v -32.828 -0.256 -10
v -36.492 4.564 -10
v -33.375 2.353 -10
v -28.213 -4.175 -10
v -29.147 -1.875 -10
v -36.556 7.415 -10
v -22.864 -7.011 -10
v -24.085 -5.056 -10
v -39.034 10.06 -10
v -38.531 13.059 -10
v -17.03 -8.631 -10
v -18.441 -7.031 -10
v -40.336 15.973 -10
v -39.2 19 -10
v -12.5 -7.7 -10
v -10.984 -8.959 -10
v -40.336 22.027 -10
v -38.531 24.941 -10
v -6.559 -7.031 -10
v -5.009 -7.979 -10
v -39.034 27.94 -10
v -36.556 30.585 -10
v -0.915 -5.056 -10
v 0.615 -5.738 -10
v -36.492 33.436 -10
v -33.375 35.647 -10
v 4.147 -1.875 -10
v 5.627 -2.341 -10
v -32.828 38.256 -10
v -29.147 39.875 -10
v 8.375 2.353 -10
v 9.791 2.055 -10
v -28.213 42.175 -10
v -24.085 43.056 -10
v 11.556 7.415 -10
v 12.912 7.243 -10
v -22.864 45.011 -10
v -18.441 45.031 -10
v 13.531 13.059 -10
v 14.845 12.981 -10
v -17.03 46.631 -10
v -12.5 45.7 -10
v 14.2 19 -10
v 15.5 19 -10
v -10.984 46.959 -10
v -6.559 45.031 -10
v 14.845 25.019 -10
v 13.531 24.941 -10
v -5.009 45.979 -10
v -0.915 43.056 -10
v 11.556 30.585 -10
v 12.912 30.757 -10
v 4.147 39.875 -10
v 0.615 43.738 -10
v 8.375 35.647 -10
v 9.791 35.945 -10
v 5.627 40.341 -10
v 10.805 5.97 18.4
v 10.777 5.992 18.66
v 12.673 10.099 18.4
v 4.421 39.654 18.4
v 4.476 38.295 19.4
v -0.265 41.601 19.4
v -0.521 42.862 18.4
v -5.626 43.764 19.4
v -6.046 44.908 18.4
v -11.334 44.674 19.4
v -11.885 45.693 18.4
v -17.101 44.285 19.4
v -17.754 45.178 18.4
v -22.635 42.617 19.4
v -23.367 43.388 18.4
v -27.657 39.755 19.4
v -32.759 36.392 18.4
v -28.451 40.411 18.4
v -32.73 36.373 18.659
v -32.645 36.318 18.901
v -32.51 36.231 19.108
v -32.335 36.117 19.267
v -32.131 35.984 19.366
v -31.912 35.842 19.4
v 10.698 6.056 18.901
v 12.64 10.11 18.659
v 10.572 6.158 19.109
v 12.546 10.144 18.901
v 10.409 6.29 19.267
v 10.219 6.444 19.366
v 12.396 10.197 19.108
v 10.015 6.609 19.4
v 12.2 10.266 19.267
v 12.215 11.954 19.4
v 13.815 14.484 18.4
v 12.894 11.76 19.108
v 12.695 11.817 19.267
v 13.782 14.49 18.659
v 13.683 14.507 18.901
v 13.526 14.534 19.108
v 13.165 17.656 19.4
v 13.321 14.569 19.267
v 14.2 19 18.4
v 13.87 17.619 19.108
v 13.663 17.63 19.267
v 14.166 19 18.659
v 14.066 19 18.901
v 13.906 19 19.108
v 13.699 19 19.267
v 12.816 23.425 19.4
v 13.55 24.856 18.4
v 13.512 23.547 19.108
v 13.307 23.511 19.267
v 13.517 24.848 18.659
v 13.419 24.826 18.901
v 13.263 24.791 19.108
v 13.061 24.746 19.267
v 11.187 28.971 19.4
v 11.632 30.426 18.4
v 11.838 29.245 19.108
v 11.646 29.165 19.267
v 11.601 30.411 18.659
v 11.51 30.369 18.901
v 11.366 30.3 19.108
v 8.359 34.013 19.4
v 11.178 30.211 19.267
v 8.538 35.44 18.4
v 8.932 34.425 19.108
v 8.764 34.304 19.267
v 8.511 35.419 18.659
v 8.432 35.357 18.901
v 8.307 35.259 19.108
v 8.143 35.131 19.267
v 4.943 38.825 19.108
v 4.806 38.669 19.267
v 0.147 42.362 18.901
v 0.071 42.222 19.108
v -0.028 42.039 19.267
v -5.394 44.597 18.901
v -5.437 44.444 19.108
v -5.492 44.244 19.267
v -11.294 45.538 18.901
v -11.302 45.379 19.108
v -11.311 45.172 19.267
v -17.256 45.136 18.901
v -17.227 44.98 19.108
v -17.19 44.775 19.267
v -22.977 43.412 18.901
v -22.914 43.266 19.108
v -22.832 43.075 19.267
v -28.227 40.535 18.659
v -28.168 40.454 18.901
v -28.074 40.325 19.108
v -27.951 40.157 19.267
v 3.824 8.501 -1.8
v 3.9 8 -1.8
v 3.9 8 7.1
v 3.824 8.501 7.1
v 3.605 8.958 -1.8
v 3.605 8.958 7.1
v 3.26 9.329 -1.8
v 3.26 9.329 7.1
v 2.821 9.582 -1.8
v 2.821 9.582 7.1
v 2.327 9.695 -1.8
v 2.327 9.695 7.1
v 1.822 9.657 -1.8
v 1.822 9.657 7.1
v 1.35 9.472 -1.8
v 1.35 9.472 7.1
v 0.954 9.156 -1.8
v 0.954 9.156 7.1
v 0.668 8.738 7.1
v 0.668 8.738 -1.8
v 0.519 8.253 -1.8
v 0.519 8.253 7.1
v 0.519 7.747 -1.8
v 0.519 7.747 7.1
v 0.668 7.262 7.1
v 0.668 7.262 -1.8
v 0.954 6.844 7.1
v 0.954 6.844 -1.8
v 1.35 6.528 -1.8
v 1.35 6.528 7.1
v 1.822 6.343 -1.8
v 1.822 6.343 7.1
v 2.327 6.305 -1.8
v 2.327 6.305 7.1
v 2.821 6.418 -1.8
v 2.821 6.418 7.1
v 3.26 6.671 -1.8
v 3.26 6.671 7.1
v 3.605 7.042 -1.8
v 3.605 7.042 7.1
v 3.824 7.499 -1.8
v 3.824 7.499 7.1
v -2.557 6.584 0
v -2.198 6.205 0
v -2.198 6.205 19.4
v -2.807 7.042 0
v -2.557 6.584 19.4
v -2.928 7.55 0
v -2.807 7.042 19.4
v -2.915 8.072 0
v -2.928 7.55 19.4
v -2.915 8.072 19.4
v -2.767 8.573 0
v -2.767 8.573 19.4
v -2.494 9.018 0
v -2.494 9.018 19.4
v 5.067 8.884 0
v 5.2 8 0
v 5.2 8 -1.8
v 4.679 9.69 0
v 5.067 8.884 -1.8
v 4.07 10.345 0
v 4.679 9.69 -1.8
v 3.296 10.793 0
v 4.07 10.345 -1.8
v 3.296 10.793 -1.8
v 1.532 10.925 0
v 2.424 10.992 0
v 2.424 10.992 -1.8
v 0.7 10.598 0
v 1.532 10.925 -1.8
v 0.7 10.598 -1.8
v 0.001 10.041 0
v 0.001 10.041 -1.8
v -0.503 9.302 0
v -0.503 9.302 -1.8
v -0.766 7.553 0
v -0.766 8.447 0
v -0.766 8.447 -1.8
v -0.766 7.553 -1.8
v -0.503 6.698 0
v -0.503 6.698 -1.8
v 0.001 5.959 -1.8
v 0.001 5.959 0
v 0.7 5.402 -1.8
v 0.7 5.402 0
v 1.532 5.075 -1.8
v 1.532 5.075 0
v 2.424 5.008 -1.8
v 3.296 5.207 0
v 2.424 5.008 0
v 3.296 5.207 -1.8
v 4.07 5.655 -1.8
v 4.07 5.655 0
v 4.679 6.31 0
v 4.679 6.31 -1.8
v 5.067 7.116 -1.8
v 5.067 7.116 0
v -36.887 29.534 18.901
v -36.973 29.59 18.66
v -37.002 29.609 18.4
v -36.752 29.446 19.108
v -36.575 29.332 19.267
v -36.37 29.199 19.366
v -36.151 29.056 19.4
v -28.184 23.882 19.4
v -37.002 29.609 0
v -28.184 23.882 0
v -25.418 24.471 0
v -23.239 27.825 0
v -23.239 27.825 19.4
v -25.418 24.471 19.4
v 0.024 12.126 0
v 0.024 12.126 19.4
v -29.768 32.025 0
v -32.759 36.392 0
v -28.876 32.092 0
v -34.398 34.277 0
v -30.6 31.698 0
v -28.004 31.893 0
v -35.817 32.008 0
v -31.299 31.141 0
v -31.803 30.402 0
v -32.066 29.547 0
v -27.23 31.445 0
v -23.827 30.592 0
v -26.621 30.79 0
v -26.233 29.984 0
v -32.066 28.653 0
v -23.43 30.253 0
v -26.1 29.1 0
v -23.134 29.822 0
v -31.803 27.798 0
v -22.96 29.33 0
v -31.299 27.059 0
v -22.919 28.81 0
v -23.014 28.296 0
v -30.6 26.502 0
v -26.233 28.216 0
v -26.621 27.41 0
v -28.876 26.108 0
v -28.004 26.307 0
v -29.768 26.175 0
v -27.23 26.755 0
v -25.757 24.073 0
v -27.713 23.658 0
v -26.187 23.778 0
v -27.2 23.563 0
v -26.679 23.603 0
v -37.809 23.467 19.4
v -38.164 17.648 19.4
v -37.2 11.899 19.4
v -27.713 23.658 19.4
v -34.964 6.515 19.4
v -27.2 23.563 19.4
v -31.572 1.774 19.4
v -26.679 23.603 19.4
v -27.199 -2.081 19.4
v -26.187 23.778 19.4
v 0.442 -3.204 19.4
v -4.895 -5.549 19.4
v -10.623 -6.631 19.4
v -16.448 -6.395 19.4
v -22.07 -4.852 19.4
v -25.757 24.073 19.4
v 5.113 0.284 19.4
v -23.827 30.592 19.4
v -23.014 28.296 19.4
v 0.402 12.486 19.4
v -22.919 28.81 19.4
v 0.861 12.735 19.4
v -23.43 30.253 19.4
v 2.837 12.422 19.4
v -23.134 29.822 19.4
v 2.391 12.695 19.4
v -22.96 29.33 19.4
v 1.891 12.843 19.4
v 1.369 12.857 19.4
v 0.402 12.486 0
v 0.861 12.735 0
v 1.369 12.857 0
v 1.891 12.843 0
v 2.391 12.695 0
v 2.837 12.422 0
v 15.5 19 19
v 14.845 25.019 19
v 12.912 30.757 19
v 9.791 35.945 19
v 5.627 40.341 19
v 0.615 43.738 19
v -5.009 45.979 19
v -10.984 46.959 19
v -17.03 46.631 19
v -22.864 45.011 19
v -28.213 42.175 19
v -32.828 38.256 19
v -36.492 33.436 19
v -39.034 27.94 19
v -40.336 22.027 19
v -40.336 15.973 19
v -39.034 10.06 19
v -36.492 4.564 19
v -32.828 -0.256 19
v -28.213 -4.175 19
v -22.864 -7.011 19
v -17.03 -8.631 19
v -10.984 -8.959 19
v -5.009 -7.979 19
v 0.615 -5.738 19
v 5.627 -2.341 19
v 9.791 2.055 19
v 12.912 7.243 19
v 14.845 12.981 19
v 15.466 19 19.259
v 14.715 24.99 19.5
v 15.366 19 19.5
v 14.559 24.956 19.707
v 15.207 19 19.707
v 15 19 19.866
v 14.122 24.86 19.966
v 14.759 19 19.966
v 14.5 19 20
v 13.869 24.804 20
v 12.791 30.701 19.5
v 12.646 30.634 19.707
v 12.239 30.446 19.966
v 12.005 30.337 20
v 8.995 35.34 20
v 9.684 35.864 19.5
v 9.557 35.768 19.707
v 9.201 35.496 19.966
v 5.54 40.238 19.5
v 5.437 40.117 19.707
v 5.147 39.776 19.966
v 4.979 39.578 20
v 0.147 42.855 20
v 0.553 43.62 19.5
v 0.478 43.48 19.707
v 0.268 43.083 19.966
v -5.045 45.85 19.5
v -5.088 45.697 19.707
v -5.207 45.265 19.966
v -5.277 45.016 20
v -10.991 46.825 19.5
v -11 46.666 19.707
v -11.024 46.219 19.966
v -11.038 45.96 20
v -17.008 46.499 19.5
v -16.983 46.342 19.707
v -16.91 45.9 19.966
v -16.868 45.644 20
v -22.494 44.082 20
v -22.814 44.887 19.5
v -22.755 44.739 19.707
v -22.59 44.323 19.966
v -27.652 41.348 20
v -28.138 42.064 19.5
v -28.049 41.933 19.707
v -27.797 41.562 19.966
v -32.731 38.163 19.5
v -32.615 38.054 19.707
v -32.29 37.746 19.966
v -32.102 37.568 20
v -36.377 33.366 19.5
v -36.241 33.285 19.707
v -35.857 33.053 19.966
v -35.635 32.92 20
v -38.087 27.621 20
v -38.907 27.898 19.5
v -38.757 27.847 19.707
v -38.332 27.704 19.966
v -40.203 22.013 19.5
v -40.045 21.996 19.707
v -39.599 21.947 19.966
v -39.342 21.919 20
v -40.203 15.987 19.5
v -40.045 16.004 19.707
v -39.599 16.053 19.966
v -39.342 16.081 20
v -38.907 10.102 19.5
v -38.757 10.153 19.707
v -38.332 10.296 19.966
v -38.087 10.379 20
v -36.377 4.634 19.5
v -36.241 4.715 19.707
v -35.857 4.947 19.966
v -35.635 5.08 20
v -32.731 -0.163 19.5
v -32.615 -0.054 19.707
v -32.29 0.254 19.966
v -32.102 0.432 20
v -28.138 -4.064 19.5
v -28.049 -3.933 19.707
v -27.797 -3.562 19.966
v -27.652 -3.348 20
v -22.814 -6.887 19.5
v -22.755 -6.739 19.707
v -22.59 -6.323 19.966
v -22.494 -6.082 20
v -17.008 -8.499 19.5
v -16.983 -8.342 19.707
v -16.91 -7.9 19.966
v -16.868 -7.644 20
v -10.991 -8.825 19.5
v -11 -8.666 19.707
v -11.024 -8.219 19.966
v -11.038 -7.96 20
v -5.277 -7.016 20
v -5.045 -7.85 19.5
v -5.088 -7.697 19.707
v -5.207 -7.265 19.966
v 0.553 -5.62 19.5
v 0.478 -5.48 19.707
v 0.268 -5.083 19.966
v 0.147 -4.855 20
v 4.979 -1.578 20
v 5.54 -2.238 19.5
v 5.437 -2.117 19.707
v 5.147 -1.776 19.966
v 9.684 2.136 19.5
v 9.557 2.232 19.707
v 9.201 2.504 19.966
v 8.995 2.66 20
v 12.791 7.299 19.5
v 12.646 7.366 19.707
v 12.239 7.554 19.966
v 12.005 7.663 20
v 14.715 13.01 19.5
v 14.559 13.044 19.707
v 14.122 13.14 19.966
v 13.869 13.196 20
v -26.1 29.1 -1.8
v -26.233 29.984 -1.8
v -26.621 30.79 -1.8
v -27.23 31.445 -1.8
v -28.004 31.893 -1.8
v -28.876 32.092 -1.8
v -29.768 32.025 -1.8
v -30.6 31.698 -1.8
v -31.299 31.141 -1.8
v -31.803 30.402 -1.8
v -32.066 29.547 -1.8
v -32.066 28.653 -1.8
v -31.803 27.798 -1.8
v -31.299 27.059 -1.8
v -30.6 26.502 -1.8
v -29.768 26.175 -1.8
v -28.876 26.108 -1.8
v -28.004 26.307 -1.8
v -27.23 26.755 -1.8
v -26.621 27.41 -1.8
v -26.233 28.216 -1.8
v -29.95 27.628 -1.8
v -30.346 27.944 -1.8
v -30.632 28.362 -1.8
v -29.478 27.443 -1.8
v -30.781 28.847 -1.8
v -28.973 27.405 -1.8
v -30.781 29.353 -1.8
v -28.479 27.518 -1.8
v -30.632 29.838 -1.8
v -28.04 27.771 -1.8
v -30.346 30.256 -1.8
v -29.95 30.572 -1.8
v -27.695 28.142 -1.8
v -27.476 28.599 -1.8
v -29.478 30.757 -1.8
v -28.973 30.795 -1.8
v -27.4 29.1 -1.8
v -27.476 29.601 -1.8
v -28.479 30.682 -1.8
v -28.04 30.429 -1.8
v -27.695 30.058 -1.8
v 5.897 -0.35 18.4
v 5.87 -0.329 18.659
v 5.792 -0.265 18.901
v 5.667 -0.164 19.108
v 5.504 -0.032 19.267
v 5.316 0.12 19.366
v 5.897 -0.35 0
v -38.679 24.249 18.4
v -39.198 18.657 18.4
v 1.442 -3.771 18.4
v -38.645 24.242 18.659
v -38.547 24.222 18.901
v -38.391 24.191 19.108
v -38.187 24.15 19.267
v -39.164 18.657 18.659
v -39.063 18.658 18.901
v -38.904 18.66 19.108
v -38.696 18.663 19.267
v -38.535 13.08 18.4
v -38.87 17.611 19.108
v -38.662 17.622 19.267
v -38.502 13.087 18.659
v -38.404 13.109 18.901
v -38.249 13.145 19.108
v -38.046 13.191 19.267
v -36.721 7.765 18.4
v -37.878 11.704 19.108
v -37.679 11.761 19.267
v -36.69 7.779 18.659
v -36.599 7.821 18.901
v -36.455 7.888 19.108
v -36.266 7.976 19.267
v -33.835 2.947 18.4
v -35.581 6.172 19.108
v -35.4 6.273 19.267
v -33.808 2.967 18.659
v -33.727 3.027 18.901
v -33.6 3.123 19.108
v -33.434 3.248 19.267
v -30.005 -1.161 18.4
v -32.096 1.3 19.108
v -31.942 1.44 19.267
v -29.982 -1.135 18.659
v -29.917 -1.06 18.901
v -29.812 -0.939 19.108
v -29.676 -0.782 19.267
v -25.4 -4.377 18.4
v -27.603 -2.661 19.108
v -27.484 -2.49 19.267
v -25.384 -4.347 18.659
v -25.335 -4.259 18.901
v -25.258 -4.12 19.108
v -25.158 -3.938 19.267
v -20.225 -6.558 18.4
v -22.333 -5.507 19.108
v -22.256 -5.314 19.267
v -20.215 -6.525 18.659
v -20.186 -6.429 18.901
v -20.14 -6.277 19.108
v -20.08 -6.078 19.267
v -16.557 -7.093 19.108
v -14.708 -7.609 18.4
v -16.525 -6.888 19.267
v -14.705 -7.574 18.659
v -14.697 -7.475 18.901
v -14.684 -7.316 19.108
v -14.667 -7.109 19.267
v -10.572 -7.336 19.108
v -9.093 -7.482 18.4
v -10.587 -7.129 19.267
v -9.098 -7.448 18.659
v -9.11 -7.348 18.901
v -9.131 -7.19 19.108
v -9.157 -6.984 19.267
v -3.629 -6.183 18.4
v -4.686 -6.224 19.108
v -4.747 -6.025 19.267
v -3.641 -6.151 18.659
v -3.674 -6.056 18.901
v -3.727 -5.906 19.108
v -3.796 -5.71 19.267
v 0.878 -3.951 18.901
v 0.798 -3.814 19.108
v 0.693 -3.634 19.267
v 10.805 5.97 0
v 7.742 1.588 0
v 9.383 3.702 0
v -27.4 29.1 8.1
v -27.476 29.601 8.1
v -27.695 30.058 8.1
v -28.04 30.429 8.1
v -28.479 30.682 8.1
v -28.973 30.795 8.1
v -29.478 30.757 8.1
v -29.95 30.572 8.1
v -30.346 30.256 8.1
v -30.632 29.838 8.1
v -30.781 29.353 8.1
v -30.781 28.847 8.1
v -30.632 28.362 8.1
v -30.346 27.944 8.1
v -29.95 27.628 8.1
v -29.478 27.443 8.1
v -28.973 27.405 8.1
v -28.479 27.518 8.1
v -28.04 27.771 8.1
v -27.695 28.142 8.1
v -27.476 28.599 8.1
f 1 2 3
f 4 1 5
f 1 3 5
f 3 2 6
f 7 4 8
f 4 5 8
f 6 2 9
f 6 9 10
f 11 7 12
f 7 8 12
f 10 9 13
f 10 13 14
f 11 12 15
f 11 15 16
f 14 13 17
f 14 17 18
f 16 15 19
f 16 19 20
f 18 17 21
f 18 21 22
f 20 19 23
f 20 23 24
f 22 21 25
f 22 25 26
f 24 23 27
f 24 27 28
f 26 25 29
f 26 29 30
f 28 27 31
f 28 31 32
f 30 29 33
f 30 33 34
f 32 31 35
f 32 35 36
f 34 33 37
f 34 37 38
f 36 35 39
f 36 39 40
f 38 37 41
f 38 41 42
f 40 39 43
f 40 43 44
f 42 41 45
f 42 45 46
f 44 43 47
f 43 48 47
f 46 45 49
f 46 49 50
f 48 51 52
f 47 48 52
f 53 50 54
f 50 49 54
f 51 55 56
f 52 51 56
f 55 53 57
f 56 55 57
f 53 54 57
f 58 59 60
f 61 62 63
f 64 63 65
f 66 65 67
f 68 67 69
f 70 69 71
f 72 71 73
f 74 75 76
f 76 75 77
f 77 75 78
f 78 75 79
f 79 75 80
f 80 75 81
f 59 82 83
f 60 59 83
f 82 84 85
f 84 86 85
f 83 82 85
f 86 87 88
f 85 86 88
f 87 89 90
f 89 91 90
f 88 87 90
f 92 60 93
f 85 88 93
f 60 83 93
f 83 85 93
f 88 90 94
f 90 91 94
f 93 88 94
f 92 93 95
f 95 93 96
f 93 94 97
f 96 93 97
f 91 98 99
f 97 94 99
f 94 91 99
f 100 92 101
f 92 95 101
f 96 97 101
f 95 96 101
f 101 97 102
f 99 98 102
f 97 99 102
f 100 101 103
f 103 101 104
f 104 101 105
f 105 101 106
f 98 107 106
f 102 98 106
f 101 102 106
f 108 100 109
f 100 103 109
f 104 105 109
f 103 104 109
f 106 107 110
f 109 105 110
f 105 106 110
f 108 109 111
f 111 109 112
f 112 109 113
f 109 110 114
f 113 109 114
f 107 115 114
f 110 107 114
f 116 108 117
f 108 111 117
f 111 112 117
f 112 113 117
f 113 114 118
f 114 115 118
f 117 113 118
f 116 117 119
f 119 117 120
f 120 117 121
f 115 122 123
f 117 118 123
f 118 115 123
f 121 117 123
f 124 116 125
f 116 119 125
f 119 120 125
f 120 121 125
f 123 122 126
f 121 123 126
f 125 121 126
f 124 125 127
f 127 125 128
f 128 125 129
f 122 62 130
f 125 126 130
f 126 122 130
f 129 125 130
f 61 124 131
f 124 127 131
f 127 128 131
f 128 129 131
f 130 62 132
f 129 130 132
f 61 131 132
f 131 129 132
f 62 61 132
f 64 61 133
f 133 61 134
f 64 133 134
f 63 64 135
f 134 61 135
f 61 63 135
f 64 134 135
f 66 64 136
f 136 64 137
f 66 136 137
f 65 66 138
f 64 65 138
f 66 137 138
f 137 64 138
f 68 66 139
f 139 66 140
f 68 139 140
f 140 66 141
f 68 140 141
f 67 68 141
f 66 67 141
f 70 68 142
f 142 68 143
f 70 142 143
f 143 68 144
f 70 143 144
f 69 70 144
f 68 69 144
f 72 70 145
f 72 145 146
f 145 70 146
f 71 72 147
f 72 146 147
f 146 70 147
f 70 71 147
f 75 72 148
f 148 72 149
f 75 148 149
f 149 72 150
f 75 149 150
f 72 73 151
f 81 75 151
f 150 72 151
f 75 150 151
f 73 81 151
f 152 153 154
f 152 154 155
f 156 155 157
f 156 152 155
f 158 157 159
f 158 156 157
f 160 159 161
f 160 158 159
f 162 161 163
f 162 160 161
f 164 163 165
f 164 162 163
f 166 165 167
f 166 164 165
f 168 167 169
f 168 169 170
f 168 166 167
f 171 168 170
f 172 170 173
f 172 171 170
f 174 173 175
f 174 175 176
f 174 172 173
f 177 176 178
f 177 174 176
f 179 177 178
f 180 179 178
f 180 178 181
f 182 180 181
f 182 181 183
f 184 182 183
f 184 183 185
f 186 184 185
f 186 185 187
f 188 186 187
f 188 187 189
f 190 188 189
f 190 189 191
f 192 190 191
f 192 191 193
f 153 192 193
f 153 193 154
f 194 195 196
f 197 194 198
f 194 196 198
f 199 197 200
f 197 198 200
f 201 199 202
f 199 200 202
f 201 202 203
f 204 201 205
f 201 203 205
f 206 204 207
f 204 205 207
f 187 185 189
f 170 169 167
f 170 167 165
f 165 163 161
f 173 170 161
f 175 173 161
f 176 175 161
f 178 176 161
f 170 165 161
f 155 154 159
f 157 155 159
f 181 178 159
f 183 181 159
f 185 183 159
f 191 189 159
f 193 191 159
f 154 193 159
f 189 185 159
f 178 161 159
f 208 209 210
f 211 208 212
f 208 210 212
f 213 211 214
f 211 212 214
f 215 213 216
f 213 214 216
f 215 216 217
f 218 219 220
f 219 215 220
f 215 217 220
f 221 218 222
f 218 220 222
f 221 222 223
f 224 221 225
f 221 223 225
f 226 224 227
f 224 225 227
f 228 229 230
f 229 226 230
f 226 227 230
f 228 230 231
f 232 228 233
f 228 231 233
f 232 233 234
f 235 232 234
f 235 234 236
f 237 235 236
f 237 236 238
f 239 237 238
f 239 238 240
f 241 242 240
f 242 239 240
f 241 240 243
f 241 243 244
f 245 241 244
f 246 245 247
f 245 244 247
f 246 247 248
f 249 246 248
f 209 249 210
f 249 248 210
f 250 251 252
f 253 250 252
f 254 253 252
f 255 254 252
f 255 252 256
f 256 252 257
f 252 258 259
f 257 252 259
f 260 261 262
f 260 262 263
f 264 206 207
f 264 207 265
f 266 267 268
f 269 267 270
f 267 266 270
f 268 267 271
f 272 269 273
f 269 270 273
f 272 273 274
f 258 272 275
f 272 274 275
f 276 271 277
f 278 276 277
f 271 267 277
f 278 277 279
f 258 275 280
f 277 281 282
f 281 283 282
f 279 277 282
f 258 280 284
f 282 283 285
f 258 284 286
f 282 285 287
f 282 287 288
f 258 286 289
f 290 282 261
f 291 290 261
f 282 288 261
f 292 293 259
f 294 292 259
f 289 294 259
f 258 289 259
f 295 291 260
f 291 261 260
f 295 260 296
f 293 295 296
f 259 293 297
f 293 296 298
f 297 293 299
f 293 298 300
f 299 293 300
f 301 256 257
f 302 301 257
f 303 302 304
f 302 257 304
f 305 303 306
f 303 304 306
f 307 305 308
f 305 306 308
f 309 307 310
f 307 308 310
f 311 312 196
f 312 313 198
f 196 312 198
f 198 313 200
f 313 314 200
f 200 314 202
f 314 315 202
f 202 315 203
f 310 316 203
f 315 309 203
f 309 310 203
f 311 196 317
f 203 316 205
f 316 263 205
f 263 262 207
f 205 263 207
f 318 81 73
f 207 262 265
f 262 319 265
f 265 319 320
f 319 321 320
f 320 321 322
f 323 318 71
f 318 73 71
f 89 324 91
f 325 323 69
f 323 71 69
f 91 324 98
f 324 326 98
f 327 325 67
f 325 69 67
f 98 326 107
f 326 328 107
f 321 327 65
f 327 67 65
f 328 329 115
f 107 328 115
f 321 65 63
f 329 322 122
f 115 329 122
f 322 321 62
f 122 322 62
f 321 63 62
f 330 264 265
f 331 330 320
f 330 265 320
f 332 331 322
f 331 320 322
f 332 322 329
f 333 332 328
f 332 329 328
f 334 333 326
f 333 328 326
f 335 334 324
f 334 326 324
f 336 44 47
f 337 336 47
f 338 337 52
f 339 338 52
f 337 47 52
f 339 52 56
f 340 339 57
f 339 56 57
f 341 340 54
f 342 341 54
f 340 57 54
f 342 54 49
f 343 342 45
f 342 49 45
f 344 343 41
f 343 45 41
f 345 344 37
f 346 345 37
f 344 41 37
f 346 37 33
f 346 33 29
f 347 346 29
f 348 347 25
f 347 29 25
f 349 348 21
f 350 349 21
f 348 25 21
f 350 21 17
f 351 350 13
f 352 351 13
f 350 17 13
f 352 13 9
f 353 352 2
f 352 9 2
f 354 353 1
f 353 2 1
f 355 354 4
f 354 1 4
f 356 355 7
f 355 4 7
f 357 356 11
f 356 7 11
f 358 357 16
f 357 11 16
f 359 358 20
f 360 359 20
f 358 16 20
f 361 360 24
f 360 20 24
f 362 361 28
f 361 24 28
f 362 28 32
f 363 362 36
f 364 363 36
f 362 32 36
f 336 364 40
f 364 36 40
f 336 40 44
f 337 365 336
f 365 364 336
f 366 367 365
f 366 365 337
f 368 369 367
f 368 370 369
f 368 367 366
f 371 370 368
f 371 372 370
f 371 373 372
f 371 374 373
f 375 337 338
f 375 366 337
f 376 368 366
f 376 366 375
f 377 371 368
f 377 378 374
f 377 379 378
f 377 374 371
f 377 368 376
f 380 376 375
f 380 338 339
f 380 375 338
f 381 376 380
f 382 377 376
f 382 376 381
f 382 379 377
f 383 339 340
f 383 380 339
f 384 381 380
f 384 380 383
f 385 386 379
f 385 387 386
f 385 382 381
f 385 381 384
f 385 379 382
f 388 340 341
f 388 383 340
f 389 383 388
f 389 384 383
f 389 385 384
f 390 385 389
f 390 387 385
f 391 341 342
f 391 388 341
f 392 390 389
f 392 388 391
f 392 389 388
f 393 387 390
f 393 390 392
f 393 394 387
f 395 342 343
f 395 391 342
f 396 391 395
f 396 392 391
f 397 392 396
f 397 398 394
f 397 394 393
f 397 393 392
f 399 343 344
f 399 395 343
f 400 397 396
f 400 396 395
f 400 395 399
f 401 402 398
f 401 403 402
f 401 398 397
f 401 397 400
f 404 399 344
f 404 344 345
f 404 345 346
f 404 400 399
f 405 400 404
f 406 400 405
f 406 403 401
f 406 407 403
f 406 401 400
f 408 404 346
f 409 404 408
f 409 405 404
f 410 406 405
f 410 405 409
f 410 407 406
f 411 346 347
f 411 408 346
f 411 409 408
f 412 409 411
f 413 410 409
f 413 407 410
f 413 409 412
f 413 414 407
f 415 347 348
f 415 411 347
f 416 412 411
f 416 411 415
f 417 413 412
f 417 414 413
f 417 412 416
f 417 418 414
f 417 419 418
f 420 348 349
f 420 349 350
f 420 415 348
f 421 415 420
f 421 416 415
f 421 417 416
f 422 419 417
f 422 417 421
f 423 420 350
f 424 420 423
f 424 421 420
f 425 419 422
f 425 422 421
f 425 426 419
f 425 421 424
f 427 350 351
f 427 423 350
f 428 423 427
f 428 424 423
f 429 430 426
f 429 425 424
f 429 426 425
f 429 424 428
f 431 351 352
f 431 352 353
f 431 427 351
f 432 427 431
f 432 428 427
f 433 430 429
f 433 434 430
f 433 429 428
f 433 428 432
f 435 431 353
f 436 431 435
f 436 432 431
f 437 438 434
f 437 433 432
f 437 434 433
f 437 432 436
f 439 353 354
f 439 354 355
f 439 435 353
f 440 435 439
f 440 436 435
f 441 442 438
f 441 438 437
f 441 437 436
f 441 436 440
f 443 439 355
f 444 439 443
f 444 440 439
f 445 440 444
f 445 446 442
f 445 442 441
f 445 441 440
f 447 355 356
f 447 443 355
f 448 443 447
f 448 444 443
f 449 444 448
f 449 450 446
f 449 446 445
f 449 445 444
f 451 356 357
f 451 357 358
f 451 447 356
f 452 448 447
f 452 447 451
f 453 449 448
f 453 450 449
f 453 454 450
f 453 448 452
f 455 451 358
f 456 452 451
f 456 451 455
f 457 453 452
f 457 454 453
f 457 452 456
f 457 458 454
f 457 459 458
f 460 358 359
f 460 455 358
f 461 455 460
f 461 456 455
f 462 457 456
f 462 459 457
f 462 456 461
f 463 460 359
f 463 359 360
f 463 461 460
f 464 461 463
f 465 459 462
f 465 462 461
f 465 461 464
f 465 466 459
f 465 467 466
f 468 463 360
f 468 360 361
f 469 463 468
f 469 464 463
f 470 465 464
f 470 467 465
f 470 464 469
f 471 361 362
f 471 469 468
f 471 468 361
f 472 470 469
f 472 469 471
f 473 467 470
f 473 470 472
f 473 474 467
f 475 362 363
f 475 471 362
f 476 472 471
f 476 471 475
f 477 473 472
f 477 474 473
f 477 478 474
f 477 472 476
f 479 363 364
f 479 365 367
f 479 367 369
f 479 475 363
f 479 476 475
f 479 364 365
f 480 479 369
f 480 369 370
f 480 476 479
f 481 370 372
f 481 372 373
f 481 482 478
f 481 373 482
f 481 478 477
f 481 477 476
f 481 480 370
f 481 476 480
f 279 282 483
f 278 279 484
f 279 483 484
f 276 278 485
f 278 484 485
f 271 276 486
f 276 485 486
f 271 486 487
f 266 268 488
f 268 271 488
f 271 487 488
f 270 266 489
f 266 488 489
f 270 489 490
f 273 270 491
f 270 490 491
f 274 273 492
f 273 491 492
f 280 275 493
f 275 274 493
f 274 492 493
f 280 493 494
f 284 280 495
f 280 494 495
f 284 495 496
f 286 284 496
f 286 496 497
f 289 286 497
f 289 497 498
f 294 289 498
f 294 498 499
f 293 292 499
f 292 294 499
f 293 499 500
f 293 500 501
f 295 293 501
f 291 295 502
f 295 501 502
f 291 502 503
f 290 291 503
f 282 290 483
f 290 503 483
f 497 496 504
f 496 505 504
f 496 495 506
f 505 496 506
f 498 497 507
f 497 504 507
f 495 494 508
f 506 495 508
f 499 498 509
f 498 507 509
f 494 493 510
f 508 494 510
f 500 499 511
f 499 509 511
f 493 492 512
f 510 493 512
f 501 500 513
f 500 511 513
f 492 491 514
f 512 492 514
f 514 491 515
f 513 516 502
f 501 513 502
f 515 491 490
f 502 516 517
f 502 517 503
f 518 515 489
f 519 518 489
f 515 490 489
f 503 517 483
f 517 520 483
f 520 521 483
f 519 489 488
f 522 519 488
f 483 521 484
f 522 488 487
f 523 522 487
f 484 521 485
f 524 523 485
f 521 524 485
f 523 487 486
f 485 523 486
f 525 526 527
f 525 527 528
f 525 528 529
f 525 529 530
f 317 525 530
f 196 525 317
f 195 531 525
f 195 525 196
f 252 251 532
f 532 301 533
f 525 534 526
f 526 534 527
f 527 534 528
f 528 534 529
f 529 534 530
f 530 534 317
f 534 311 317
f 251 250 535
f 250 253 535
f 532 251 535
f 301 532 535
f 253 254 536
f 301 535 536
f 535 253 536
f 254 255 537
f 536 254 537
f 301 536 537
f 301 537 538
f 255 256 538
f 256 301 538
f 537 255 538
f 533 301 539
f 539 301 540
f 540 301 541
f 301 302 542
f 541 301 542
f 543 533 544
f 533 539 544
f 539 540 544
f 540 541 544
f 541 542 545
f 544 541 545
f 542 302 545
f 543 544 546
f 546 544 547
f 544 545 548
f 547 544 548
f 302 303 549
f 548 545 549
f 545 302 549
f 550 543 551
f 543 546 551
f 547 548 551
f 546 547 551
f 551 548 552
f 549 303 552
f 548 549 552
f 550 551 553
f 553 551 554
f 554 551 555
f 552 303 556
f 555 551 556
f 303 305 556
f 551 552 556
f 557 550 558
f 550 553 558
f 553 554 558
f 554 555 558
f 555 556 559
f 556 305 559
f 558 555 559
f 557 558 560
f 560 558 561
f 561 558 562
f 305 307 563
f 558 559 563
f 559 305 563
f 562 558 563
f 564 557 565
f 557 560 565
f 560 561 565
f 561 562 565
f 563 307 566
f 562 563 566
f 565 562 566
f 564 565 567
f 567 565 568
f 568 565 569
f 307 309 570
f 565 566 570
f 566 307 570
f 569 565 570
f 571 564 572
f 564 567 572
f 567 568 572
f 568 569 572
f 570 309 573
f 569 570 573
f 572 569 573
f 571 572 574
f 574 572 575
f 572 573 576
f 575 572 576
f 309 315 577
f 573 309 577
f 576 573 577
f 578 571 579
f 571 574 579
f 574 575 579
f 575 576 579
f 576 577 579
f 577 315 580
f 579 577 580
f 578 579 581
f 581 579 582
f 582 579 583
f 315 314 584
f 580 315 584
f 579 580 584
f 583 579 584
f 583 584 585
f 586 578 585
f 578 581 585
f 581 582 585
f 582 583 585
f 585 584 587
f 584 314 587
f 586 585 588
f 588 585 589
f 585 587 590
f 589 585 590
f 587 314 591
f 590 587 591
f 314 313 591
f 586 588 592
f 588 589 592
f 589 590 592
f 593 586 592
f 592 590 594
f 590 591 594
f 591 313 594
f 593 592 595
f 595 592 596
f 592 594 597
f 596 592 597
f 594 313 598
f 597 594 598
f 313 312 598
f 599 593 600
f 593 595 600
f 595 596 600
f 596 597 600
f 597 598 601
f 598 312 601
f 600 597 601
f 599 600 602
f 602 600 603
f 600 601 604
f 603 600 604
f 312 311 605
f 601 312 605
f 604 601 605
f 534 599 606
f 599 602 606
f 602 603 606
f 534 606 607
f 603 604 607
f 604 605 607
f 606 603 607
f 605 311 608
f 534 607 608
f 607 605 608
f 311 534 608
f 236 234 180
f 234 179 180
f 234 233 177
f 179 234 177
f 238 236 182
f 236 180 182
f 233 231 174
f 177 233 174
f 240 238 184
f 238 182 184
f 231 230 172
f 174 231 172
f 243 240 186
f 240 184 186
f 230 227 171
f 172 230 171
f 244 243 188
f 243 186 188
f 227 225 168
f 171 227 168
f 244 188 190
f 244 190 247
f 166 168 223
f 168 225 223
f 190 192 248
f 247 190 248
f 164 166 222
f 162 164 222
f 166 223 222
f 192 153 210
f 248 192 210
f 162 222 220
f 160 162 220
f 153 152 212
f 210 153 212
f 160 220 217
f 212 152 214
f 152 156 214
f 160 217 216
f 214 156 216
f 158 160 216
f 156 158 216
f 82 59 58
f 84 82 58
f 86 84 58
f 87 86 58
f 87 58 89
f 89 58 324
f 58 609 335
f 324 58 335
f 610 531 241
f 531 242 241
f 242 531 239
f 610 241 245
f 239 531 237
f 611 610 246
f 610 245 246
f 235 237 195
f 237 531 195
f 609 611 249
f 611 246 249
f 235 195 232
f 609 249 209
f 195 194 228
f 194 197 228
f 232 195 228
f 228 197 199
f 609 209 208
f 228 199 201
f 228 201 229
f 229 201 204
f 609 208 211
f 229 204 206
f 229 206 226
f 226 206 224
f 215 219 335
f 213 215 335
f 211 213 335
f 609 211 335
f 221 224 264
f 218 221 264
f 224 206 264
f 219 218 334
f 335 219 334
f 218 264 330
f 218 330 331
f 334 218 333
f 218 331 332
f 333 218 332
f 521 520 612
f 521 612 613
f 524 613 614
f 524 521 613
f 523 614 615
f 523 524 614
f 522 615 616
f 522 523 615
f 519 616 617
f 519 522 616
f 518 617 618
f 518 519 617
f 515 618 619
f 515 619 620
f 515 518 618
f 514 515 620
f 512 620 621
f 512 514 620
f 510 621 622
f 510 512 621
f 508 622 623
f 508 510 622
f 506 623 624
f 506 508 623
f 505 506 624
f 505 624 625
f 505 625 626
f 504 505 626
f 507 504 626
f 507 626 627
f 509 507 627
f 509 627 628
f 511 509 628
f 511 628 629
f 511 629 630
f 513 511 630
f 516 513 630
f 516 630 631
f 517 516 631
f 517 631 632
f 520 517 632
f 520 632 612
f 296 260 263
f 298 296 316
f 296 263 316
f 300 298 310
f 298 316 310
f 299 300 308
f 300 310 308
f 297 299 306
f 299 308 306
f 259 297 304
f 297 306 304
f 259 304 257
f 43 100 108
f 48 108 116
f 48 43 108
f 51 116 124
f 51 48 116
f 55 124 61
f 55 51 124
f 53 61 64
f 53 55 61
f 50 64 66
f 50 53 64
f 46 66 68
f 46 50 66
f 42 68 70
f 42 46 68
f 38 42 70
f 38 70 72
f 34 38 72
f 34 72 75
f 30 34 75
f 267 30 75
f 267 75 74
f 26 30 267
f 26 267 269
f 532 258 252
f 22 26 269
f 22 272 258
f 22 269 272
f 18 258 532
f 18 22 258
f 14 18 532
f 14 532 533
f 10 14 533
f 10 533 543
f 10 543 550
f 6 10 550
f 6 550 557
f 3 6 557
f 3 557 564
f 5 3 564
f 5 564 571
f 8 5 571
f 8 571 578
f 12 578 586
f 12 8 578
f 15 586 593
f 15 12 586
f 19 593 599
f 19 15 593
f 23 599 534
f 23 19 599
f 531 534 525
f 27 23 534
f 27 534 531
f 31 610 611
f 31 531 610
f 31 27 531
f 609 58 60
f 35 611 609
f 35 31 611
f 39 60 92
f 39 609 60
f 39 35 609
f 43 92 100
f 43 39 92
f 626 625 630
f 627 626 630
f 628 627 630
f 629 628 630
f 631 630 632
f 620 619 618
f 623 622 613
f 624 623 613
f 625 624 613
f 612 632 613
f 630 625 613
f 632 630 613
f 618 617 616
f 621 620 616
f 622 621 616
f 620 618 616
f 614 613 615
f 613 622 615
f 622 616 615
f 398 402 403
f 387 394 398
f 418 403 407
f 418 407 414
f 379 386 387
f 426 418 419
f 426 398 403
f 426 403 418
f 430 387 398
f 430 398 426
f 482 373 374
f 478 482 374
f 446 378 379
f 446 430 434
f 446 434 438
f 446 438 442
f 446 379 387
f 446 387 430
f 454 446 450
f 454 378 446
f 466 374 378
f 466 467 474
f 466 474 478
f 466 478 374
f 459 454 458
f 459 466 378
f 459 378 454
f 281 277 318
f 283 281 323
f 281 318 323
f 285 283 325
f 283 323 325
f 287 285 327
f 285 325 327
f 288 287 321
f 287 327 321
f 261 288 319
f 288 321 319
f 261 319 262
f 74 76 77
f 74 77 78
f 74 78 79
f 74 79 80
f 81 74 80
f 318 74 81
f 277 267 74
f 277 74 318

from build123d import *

# Parameters (mm, degrees)
CYLINDER027_R          = 1.7
CYLINDER027_DEPTH      = 10.5
CYLINDER026_R          = 1.7
CYLINDER026_DEPTH      = 11.5
CYLINDER018_R          = 26.7
CYLINDER018_DEPTH      = 30
CYLINDER019_R          = 28
CYLINDER019_DEPTH      = 30
FILLET001_R            = 1
BOX001_W               = 8
BOX001_H               = 13.5
BOX001_DEPTH           = 20
BOX001_PLACEMENT_ANGLE = 237
FILLET004_1_R          = 2.5
FILLET004_2_R          = 2
CYLINDER021_R          = 3
CYLINDER021_DEPTH      = 5.5
CYLINDER020_R          = 3
CYLINDER020_DEPTH      = 5.5
BOX_W                  = 8
BOX_H                  = 13.5
BOX_DEPTH              = 20
BOX_PLACEMENT_ANGLE    = 51
FILLET003_1_R          = 2.5
FILLET003_2_R          = 2


with BuildPart() as vaciado_tope012:
    # Cylinder027 → Cylinder027 (new body)
    with BuildSketch(Plane(origin=(2.2, 8, -3.4), x_dir=(1, 0, 0), z_dir=(0, 0, 1))):
        Circle(CYLINDER027_R)
    extrude(amount=CYLINDER027_DEPTH)


with BuildPart() as vaciados_de_m3:
    # Cylinder026 → Cylinder026 (new body)
    with BuildSketch(Plane(origin=(-29.1, 29.1, -3.4), x_dir=(1, 0, 0), z_dir=(0, 0, 1))):
        Circle(CYLINDER026_R)
    extrude(amount=CYLINDER026_DEPTH)

    # Fusion007: union vaciado tope012
    add(vaciado_tope012.part)


with BuildPart() as base_exterior_vaciado001:
    # Cylinder018 → Cylinder018 (new body)
    with BuildSketch(Plane(origin=(-12.5, 19, -10.6), x_dir=(1, 0, 0), z_dir=(0, 0, 1))):
        Circle(CYLINDER018_R)
    extrude(amount=CYLINDER018_DEPTH)


with BuildPart() as base:
    # Cylinder019 → Cylinder019 (new body)
    with BuildSketch(Plane(origin=(-12.5, 19, -10), x_dir=(1, 0, 0), z_dir=(0, 0, 1))):
        Circle(CYLINDER019_R)
    extrude(amount=CYLINDER019_DEPTH)

    # Cut011: cut base exterior vaciado001
    add(base_exterior_vaciado001.part, mode=Mode.SUBTRACT)

    # Fillet001
    fillet001_edges = [base.edges().sort_by_distance(p)[0] for p in [
        (-40.5, 19, 20),
        (-39.2, 19, 19.4),
    ]]
    fillet(fillet001_edges, radius=FILLET001_R)


with BuildPart() as fijacion002:
    # Box001 → Box001 (new body)
    with BuildSketch(Plane.XY):
        with Locations((4, 6.75)):
            Rectangle(BOX001_W, BOX001_H)
    extrude(amount=BOX001_DEPTH)


with BuildPart() as fijacion002_1:
    # Box001 placement: moved
    add(fijacion002.part.moved(Location((-33.471804, 36.855151, 0))).rotate(Axis((-33.471804, 36.855151, 0), (0, 0, 1)), BOX001_PLACEMENT_ANGLE))

    # Fillet004 1
    fillet004_1_edges = [fijacion002_1.edges().sort_by_distance(p)[0] for p in [
        (-35.65036, 33.500468, 20),
    ]]
    fillet(fillet004_1_edges, radius=FILLET004_1_R)

    # Fillet004 2
    fillet004_2_edges = [fijacion002_1.edges().sort_by_distance(p)[0] for p in [
        (-22.149751, 29.502524, 10),
        (-26.506863, 22.793159, 10),
    ]]
    fillet(fillet004_2_edges, radius=FILLET004_2_R)


with BuildPart() as tope010:
    # Cylinder021 → Cylinder021 (new body)
    with BuildSketch(Plane(origin=(-29.1, 29.1, -1.8), x_dir=(1, 0, 0), z_dir=(0, 0, 1))):
        Circle(CYLINDER021_R)
    extrude(amount=CYLINDER021_DEPTH)


with BuildPart() as tope009:
    # Cylinder020 → Cylinder020 (new body)
    with BuildSketch(Plane(origin=(2.2, 8, -1.8), x_dir=(1, 0, 0), z_dir=(0, 0, 1))):
        Circle(CYLINDER020_R)
    extrude(amount=CYLINDER020_DEPTH)


with BuildPart() as base_v10_final:
    # Box → Box (new body)
    with BuildSketch(Plane.XY):
        with Locations((4, 6.75)):
            Rectangle(BOX_W, BOX_H)
    extrude(amount=BOX_DEPTH)


with BuildPart() as base_v10_final_1:
    # Box placement: moved
    add(base_v10_final.part.moved(Location((6.739128, -1.032332, 0))).rotate(Axis((6.739128, -1.032332, 0), (0, 0, 1)), BOX_PLACEMENT_ANGLE))

    # Fillet003 1
    fillet003_1_edges = [base_v10_final_1.edges().sort_by_distance(p)[0] for p in [
        (9.256409, 2.076252, 20),
    ]]
    fillet(fillet003_1_edges, radius=FILLET003_1_R)

    # Fillet003 2
    fillet003_2_edges = [base_v10_final_1.edges().sort_by_distance(p)[0] for p in [
        (-3.752343, 7.463494, 10),
        (1.282221, 13.680661, 10),
    ]]
    fillet(fillet003_2_edges, radius=FILLET003_2_R)

    # Fusion006: union base, fijacion002, Tope010, Tope009
    add(base.part)
    add(fijacion002_1.part)
    add(tope010.part)
    add(tope009.part)

    # Cut019: cut vaciados de M3
    add(vaciados_de_m3.part, mode=Mode.SUBTRACT)


solid = base_v10_final_1.part
